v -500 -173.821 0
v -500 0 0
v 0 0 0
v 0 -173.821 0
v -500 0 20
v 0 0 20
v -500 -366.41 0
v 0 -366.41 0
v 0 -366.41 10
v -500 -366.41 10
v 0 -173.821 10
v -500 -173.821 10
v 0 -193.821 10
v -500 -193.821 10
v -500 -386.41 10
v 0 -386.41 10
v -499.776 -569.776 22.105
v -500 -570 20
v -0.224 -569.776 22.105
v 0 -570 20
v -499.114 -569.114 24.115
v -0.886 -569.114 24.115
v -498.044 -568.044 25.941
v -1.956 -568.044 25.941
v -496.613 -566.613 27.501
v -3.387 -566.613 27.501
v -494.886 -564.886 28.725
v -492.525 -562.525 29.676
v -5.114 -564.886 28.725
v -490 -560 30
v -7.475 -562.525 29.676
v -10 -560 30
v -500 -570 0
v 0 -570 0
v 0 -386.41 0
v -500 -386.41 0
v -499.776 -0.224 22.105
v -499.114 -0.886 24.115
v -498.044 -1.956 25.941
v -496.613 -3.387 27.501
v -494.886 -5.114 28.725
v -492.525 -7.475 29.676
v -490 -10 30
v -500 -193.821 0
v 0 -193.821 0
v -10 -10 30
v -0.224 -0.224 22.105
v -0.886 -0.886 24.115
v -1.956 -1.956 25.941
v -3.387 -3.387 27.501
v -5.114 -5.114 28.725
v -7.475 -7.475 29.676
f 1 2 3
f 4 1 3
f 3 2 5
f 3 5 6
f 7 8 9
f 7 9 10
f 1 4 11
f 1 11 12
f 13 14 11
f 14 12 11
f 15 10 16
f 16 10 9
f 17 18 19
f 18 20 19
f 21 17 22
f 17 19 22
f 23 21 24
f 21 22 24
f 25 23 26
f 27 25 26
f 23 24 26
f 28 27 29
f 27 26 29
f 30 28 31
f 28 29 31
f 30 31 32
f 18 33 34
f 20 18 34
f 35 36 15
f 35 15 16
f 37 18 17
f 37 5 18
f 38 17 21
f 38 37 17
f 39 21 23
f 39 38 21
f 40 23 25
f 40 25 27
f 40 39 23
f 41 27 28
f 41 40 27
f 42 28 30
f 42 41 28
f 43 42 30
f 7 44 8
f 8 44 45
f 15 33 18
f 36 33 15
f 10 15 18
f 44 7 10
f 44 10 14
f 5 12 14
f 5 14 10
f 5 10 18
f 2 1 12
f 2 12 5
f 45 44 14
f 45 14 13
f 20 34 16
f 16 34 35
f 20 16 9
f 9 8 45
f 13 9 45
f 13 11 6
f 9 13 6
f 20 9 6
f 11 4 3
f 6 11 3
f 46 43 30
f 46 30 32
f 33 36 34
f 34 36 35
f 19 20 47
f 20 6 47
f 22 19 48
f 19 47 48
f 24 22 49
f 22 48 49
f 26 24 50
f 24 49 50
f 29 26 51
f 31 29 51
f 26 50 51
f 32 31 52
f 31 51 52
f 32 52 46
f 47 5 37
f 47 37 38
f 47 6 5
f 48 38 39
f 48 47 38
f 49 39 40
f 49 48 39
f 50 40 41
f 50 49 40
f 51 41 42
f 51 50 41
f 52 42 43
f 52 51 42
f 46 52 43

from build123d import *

# Parameters (mm, degrees)
SKETCH1_W           = 500
SKETCH1_H           = 570
BOSS_EXTRUDE1_DEPTH = 30
FILLET1_R           = 10
SKETCH3_W           = 500
SKETCH3_H           = 20
SKETCH3_W_2         = 24.124551532
SKETCH3_W_3         = 40.885345678
SKETCH3_W_4         = 75.086674906
CUT_EXTRUDE1_DEPTH  = 10


with BuildPart() as part:
    # Sketch1 → Boss-Extrude1 (new body)
    with BuildSketch(Plane.XY):
        with Locations((-250, -285)):
            Rectangle(SKETCH1_W, SKETCH1_H)
    extrude(amount=BOSS_EXTRUDE1_DEPTH)

    # Fillet1
    fillet1_edges = [part.edges().sort_by_distance(p)[0] for p in [
        (-500, -285, 30),
        (-250, -570, 30),
        (0, -285, 30),
        (-250, 0, 30),
    ]]
    fillet(fillet1_edges, radius=FILLET1_R)

    # Sketch3 → Cut-Extrude1 (cut)
    with BuildSketch(Plane.XY):
        with Locations((-250, -376.410467709)):
            Rectangle(SKETCH3_W, SKETCH3_H)
        with Locations((-512.062275766, -376.410467709)):
            Rectangle(SKETCH3_W_2, SKETCH3_H)
        with Locations((12.062275766, -376.410467709)):
            Rectangle(SKETCH3_W_2, SKETCH3_H)
        with Locations((20.442672839, -183.821390857)):
            Rectangle(SKETCH3_W_3, SKETCH3_H)
        with Locations((-250, -183.821390857)):
            Rectangle(SKETCH3_W, SKETCH3_H)
        with Locations((-537.543337453, -183.821390857)):
            Rectangle(SKETCH3_W_4, SKETCH3_H)
    extrude(amount=CUT_EXTRUDE1_DEPTH, mode=Mode.SUBTRACT)


solid = part.part
